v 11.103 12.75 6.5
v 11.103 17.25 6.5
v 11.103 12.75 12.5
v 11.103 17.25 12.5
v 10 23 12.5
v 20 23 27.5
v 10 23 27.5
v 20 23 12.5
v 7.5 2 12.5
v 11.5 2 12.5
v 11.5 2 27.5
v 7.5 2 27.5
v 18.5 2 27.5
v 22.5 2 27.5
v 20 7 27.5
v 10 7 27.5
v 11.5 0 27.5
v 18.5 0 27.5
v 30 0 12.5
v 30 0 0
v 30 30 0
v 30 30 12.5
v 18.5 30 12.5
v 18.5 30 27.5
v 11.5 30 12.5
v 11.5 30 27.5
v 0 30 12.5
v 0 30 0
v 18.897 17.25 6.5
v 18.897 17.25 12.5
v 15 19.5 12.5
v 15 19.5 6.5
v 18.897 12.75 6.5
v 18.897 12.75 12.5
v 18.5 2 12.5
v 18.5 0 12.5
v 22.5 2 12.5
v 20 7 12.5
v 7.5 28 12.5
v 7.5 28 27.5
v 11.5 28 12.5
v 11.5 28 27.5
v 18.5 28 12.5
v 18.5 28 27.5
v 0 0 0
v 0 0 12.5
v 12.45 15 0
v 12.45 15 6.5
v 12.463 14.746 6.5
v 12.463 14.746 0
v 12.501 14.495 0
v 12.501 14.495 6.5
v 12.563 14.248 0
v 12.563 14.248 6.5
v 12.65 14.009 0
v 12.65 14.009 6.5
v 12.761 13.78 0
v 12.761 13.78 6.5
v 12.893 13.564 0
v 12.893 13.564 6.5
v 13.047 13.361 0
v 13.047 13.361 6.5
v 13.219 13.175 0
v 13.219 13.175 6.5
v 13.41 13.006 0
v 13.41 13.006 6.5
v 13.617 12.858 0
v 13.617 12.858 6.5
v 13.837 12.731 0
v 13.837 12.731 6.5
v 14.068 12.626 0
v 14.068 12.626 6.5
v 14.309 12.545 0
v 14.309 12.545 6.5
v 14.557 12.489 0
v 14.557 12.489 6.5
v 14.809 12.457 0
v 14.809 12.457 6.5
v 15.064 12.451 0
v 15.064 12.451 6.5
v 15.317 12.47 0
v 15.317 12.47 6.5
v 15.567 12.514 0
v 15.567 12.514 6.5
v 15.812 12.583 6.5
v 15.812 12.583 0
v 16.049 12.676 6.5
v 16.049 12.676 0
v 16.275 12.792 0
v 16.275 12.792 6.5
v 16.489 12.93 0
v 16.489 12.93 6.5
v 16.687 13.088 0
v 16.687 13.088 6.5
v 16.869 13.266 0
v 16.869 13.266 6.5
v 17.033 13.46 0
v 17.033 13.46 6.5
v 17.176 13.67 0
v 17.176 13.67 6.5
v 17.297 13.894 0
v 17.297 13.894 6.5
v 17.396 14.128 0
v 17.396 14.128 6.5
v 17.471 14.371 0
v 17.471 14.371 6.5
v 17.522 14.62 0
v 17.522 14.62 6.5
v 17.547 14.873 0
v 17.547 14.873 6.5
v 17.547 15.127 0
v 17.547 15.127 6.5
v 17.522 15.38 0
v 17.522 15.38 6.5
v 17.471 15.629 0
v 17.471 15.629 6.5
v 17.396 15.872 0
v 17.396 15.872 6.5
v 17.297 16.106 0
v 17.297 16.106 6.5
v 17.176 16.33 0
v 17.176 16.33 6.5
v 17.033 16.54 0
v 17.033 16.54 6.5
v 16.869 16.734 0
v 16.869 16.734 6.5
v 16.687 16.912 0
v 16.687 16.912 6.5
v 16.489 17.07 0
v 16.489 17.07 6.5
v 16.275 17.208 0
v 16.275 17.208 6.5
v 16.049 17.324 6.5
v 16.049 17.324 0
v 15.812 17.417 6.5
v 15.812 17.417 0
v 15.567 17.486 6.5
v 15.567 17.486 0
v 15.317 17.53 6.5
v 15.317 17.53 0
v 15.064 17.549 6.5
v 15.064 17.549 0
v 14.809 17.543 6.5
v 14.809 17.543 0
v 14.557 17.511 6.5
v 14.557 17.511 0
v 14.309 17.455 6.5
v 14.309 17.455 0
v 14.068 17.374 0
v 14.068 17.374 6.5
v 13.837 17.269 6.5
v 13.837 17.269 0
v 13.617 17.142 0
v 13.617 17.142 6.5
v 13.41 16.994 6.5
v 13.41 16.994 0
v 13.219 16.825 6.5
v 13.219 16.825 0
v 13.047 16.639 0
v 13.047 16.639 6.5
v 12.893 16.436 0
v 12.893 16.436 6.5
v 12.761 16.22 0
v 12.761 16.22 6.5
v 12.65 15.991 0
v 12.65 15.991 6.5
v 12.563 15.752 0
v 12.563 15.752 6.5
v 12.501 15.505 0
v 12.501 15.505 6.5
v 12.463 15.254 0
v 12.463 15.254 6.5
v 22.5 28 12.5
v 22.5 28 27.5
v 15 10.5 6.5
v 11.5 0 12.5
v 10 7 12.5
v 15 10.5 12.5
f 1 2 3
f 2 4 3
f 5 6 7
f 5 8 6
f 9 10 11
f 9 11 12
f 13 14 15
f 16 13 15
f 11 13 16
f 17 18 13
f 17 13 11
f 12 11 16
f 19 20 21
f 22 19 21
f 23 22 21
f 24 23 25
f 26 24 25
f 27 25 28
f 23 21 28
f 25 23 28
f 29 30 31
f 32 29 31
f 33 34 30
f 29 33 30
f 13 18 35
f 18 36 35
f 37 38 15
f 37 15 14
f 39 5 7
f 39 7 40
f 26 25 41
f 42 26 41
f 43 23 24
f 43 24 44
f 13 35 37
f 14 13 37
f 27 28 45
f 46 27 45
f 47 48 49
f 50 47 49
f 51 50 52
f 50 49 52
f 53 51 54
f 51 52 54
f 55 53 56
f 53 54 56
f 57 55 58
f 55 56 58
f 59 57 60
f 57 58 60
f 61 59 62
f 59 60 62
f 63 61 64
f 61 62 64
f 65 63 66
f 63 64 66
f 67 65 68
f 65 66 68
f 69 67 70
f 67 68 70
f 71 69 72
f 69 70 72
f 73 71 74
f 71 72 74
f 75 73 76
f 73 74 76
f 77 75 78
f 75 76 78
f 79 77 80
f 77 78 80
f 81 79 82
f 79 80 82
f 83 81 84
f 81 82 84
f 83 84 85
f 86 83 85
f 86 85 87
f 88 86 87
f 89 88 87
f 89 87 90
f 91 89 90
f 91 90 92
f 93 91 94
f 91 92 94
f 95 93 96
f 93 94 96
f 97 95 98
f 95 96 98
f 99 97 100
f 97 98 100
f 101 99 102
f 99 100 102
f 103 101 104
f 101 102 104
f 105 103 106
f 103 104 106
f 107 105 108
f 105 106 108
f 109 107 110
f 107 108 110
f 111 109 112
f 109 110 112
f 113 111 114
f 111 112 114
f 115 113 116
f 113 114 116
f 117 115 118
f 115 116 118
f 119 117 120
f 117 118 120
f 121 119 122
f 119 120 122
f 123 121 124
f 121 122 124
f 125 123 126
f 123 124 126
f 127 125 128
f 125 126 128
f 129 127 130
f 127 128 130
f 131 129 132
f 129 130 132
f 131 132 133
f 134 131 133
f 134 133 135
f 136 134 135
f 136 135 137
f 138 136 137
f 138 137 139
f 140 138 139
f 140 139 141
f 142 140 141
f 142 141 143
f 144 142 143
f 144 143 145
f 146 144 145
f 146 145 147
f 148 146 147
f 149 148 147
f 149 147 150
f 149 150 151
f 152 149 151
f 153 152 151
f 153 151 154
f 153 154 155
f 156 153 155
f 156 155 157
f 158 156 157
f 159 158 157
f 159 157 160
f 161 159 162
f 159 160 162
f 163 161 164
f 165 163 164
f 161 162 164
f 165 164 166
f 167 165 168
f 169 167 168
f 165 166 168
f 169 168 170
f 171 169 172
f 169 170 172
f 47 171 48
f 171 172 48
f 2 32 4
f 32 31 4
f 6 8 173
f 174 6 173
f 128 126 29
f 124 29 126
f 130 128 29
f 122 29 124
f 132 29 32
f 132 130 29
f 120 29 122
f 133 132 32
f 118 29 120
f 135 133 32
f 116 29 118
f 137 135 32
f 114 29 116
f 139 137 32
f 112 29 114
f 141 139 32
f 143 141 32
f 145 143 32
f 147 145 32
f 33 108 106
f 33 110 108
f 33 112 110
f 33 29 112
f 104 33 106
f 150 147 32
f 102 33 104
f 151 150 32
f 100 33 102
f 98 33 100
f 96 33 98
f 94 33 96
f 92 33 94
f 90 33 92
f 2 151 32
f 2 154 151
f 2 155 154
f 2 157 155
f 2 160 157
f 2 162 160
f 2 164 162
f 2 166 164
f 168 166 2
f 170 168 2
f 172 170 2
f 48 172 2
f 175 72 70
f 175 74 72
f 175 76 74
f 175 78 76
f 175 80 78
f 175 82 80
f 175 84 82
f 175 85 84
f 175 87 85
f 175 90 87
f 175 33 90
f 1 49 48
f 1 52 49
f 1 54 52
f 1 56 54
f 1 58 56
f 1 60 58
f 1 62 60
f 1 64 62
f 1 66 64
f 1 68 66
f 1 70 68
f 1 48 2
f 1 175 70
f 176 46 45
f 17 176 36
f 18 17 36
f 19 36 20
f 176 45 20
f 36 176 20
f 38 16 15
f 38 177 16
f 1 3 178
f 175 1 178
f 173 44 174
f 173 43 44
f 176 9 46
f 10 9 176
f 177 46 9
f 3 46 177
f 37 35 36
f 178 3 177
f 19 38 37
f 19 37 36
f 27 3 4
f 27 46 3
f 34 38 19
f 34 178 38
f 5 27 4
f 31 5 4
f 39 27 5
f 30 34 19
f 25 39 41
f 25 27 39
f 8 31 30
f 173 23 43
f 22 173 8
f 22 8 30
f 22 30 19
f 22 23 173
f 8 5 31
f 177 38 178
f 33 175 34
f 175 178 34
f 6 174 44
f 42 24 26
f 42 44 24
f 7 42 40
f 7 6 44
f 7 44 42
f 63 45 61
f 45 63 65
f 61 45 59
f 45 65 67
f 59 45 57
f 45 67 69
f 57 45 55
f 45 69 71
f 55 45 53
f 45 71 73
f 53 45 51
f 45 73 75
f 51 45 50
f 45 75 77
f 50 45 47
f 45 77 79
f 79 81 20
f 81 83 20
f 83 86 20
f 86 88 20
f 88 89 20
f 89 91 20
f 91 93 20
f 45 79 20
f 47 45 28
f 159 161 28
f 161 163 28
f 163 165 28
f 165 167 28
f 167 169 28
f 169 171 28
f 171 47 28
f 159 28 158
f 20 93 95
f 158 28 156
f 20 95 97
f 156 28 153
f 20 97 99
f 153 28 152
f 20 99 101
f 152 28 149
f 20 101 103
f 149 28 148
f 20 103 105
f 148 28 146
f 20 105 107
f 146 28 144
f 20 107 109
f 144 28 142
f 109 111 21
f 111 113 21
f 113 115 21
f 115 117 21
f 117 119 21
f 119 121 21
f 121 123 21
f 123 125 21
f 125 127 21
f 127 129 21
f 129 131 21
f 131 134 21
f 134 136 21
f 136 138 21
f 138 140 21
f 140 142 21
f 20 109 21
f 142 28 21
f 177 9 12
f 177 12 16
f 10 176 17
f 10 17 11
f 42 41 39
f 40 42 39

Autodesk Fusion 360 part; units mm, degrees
sketch "Sketch1" plane through (0, 0, 0) normal (0, 0, 1) x (1, 0, 0)
  line L0 (0, 0) -> (30, 0)
  line L1 (30, 0) -> (30, 30)
  line L2 (30, 30) -> (0, 30)
  line L3 (0, 30) -> (0, 0)
  dimension "d1" = 30
  dimension "d2" = 30
extrude "Extrude1" add sketch "Sketch1" along normal blind 12.5
sketch "Sketch2" plane through (0, 0, 12.5) normal (0, 0, 1) x (-1, 0, 0)
  line L0 (0, -30) -> (0, 0)
  line L1 (0, 0) -> (-30, 0)
  line L2 (-30, 0) -> (-30, -30)
  line L3 (-30, -30) -> (0, -30)
  line L4 (-15, -30) -> (-11.5, -30)
  line L5 (-15, -30) -> (-18.5, -30)
  line L6 (-18.5, -30) -> (-18.5, -28)
  line L7 (-11.5, -30) -> (-11.5, -28)
  line L8 (-15, -28) -> (-22.5, -28)
  line L9 (-15, -28) -> (-7.5, -28)
  line L10 (-15, -30) -> (-15, -23)
  line L11 (-15, -23) -> (-10, -23)
  line L12 (-15, -23) -> (-20, -23)
  line L13 (-10, -23) -> (-7.5, -28)
  line L14 (-20, -23) -> (-22.5, -28)
  dimension "d5" = 3.5
  dimension "d6" = 3.5
  dimension "d7" = 7.5
  dimension "d8" = 7.5
  dimension "d9" = 7
  dimension "d10" = 5
  dimension "d11" = 5
extrude "Extrude2" add sketch "Sketch2" along normal blind 15 contours L3 L4 L7 L9 L10 | L3 L5 L6 L8 L10 | L9 L10 L11 L13 | L8 L10 L12 L14
sketch "Sketch3" plane through (0, 0, 12.5) normal (0, 0, 1) x (-1, 0, 0)
  line L0 (-18.5, -30) -> (-18.5, -28)
  line L1 (-18.5, -28) -> (-22.5, -28)
  line L2 (-22.5, -28) -> (-20, -23)
  line L3 (-20, -23) -> (-10, -23)
  line L4 (-10, -23) -> (-7.5, -28)
  line L5 (-7.5, -28) -> (-11.5, -28)
  line L6 (-11.5, -28) -> (-11.5, -30)
  line L7 (-11.5, -30) -> (0, -30)
  line L8 (0, -30) -> (0, 0)
  line L9 (0, 0) -> (-30, 0)
  line L10 (-30, 0) -> (-30, -30)
  line L11 (-30, -30) -> (-18.5, -30)
  line L12 (-11.5, 0) -> (-11.5, -2)
  line L13 (-18.5, 0) -> (-18.5, -2)
  line L14 (-11.5, -2) -> (-7.5, -2)
  line L15 (-18.5, -2) -> (-22.5, -2)
  line L16 (-15, 0) -> (-15, -7)
  line L17 (-15, -7) -> (-20, -7)
  line L18 (-20, -7) -> (-22.5, -2)
  line L19 (-15, -7) -> (-10, -7)
  line L20 (-7.5, -2) -> (-10, -7)
  dimension "d15" = 4
  dimension "d16" = 4
  dimension "d17" = 7
  dimension "d18" = 5
extrude "Extrude3" add sketch "Sketch3" along normal blind 15 contours L9 L13 L15 L16 L17 L18 | L9 L12 L14 L16 L19 L20
sketch "Sketch4" plane through (0, 0, 12.5) normal (0, 0, 1) x (-1, 0, 0)
  line L0 (-18.5, -2) -> (-18.5, 0)
  line L1 (-18.5, 0) -> (-30, 0)
  line L2 (-30, 0) -> (-30, -30)
  line L3 (-30, -30) -> (-18.5, -30)
  line L4 (-18.5, -30) -> (-18.5, -28)
  line L5 (-18.5, -28) -> (-22.5, -28)
  line L6 (-22.5, -28) -> (-20, -23)
  line L7 (-20, -23) -> (-10, -23)
  line L8 (-10, -23) -> (-7.5, -28)
  line L9 (-7.5, -28) -> (-11.5, -28)
  line L10 (-11.5, -28) -> (-11.5, -30)
  line L11 (-11.5, -30) -> (0, -30)
  line L12 (0, -30) -> (0, 0)
  line L13 (0, 0) -> (-11.5, 0)
  line L14 (-11.5, 0) -> (-11.5, -2)
  line L15 (-11.5, -2) -> (-7.5, -2)
  line L16 (-7.5, -2) -> (-10, -7)
  line L17 (-10, -7) -> (-20, -7)
  line L18 (-20, -7) -> (-22.5, -2)
  line L19 (-22.5, -2) -> (-18.5, -2)
  line L20 (-15, -10.5) -> (-18.8971, -12.75)
  line L21 (-18.8971, -12.75) -> (-18.8971, -17.25)
  line L22 (-18.8971, -17.25) -> (-15, -19.5)
  line L23 (-15, -19.5) -> (-11.1029, -17.25)
  line L24 (-11.1029, -17.25) -> (-11.1029, -12.75)
  line L25 (-11.1029, -12.75) -> (-15, -10.5)
  point P0 (-15, -15)
  dimension "d21" = 4.5
extrude "Extrude4" cut sketch "Sketch4" against normal blind 6 contours L20 L21 L22 L23 L24 L25
sketch "Sketch5" plane through (0, 0, 6.5) normal (0, 0, 1) x (-1, 0, 0)
  line L0 (-11.1029, -12.75) -> (-15, -10.5)
  line L1 (-15, -10.5) -> (-18.8971, -12.75)
  line L2 (-18.8971, -12.75) -> (-18.8971, -17.25)
  line L3 (-18.8971, -17.25) -> (-15, -19.5)
  line L4 (-15, -19.5) -> (-11.1029, -17.25)
  line L5 (-11.1029, -17.25) -> (-11.1029, -12.75)
  circle A0 centre (-15, -15) radius 2.55
  dimension "d24" = 5.1
extrude "Extrude5" cut sketch "Sketch5" against normal blind 50 contours A0
equation "d7 = ( 15 / 2 ) * 1 mm"
equation "d21 = ( 9 / 2 ) * 1 mm"
